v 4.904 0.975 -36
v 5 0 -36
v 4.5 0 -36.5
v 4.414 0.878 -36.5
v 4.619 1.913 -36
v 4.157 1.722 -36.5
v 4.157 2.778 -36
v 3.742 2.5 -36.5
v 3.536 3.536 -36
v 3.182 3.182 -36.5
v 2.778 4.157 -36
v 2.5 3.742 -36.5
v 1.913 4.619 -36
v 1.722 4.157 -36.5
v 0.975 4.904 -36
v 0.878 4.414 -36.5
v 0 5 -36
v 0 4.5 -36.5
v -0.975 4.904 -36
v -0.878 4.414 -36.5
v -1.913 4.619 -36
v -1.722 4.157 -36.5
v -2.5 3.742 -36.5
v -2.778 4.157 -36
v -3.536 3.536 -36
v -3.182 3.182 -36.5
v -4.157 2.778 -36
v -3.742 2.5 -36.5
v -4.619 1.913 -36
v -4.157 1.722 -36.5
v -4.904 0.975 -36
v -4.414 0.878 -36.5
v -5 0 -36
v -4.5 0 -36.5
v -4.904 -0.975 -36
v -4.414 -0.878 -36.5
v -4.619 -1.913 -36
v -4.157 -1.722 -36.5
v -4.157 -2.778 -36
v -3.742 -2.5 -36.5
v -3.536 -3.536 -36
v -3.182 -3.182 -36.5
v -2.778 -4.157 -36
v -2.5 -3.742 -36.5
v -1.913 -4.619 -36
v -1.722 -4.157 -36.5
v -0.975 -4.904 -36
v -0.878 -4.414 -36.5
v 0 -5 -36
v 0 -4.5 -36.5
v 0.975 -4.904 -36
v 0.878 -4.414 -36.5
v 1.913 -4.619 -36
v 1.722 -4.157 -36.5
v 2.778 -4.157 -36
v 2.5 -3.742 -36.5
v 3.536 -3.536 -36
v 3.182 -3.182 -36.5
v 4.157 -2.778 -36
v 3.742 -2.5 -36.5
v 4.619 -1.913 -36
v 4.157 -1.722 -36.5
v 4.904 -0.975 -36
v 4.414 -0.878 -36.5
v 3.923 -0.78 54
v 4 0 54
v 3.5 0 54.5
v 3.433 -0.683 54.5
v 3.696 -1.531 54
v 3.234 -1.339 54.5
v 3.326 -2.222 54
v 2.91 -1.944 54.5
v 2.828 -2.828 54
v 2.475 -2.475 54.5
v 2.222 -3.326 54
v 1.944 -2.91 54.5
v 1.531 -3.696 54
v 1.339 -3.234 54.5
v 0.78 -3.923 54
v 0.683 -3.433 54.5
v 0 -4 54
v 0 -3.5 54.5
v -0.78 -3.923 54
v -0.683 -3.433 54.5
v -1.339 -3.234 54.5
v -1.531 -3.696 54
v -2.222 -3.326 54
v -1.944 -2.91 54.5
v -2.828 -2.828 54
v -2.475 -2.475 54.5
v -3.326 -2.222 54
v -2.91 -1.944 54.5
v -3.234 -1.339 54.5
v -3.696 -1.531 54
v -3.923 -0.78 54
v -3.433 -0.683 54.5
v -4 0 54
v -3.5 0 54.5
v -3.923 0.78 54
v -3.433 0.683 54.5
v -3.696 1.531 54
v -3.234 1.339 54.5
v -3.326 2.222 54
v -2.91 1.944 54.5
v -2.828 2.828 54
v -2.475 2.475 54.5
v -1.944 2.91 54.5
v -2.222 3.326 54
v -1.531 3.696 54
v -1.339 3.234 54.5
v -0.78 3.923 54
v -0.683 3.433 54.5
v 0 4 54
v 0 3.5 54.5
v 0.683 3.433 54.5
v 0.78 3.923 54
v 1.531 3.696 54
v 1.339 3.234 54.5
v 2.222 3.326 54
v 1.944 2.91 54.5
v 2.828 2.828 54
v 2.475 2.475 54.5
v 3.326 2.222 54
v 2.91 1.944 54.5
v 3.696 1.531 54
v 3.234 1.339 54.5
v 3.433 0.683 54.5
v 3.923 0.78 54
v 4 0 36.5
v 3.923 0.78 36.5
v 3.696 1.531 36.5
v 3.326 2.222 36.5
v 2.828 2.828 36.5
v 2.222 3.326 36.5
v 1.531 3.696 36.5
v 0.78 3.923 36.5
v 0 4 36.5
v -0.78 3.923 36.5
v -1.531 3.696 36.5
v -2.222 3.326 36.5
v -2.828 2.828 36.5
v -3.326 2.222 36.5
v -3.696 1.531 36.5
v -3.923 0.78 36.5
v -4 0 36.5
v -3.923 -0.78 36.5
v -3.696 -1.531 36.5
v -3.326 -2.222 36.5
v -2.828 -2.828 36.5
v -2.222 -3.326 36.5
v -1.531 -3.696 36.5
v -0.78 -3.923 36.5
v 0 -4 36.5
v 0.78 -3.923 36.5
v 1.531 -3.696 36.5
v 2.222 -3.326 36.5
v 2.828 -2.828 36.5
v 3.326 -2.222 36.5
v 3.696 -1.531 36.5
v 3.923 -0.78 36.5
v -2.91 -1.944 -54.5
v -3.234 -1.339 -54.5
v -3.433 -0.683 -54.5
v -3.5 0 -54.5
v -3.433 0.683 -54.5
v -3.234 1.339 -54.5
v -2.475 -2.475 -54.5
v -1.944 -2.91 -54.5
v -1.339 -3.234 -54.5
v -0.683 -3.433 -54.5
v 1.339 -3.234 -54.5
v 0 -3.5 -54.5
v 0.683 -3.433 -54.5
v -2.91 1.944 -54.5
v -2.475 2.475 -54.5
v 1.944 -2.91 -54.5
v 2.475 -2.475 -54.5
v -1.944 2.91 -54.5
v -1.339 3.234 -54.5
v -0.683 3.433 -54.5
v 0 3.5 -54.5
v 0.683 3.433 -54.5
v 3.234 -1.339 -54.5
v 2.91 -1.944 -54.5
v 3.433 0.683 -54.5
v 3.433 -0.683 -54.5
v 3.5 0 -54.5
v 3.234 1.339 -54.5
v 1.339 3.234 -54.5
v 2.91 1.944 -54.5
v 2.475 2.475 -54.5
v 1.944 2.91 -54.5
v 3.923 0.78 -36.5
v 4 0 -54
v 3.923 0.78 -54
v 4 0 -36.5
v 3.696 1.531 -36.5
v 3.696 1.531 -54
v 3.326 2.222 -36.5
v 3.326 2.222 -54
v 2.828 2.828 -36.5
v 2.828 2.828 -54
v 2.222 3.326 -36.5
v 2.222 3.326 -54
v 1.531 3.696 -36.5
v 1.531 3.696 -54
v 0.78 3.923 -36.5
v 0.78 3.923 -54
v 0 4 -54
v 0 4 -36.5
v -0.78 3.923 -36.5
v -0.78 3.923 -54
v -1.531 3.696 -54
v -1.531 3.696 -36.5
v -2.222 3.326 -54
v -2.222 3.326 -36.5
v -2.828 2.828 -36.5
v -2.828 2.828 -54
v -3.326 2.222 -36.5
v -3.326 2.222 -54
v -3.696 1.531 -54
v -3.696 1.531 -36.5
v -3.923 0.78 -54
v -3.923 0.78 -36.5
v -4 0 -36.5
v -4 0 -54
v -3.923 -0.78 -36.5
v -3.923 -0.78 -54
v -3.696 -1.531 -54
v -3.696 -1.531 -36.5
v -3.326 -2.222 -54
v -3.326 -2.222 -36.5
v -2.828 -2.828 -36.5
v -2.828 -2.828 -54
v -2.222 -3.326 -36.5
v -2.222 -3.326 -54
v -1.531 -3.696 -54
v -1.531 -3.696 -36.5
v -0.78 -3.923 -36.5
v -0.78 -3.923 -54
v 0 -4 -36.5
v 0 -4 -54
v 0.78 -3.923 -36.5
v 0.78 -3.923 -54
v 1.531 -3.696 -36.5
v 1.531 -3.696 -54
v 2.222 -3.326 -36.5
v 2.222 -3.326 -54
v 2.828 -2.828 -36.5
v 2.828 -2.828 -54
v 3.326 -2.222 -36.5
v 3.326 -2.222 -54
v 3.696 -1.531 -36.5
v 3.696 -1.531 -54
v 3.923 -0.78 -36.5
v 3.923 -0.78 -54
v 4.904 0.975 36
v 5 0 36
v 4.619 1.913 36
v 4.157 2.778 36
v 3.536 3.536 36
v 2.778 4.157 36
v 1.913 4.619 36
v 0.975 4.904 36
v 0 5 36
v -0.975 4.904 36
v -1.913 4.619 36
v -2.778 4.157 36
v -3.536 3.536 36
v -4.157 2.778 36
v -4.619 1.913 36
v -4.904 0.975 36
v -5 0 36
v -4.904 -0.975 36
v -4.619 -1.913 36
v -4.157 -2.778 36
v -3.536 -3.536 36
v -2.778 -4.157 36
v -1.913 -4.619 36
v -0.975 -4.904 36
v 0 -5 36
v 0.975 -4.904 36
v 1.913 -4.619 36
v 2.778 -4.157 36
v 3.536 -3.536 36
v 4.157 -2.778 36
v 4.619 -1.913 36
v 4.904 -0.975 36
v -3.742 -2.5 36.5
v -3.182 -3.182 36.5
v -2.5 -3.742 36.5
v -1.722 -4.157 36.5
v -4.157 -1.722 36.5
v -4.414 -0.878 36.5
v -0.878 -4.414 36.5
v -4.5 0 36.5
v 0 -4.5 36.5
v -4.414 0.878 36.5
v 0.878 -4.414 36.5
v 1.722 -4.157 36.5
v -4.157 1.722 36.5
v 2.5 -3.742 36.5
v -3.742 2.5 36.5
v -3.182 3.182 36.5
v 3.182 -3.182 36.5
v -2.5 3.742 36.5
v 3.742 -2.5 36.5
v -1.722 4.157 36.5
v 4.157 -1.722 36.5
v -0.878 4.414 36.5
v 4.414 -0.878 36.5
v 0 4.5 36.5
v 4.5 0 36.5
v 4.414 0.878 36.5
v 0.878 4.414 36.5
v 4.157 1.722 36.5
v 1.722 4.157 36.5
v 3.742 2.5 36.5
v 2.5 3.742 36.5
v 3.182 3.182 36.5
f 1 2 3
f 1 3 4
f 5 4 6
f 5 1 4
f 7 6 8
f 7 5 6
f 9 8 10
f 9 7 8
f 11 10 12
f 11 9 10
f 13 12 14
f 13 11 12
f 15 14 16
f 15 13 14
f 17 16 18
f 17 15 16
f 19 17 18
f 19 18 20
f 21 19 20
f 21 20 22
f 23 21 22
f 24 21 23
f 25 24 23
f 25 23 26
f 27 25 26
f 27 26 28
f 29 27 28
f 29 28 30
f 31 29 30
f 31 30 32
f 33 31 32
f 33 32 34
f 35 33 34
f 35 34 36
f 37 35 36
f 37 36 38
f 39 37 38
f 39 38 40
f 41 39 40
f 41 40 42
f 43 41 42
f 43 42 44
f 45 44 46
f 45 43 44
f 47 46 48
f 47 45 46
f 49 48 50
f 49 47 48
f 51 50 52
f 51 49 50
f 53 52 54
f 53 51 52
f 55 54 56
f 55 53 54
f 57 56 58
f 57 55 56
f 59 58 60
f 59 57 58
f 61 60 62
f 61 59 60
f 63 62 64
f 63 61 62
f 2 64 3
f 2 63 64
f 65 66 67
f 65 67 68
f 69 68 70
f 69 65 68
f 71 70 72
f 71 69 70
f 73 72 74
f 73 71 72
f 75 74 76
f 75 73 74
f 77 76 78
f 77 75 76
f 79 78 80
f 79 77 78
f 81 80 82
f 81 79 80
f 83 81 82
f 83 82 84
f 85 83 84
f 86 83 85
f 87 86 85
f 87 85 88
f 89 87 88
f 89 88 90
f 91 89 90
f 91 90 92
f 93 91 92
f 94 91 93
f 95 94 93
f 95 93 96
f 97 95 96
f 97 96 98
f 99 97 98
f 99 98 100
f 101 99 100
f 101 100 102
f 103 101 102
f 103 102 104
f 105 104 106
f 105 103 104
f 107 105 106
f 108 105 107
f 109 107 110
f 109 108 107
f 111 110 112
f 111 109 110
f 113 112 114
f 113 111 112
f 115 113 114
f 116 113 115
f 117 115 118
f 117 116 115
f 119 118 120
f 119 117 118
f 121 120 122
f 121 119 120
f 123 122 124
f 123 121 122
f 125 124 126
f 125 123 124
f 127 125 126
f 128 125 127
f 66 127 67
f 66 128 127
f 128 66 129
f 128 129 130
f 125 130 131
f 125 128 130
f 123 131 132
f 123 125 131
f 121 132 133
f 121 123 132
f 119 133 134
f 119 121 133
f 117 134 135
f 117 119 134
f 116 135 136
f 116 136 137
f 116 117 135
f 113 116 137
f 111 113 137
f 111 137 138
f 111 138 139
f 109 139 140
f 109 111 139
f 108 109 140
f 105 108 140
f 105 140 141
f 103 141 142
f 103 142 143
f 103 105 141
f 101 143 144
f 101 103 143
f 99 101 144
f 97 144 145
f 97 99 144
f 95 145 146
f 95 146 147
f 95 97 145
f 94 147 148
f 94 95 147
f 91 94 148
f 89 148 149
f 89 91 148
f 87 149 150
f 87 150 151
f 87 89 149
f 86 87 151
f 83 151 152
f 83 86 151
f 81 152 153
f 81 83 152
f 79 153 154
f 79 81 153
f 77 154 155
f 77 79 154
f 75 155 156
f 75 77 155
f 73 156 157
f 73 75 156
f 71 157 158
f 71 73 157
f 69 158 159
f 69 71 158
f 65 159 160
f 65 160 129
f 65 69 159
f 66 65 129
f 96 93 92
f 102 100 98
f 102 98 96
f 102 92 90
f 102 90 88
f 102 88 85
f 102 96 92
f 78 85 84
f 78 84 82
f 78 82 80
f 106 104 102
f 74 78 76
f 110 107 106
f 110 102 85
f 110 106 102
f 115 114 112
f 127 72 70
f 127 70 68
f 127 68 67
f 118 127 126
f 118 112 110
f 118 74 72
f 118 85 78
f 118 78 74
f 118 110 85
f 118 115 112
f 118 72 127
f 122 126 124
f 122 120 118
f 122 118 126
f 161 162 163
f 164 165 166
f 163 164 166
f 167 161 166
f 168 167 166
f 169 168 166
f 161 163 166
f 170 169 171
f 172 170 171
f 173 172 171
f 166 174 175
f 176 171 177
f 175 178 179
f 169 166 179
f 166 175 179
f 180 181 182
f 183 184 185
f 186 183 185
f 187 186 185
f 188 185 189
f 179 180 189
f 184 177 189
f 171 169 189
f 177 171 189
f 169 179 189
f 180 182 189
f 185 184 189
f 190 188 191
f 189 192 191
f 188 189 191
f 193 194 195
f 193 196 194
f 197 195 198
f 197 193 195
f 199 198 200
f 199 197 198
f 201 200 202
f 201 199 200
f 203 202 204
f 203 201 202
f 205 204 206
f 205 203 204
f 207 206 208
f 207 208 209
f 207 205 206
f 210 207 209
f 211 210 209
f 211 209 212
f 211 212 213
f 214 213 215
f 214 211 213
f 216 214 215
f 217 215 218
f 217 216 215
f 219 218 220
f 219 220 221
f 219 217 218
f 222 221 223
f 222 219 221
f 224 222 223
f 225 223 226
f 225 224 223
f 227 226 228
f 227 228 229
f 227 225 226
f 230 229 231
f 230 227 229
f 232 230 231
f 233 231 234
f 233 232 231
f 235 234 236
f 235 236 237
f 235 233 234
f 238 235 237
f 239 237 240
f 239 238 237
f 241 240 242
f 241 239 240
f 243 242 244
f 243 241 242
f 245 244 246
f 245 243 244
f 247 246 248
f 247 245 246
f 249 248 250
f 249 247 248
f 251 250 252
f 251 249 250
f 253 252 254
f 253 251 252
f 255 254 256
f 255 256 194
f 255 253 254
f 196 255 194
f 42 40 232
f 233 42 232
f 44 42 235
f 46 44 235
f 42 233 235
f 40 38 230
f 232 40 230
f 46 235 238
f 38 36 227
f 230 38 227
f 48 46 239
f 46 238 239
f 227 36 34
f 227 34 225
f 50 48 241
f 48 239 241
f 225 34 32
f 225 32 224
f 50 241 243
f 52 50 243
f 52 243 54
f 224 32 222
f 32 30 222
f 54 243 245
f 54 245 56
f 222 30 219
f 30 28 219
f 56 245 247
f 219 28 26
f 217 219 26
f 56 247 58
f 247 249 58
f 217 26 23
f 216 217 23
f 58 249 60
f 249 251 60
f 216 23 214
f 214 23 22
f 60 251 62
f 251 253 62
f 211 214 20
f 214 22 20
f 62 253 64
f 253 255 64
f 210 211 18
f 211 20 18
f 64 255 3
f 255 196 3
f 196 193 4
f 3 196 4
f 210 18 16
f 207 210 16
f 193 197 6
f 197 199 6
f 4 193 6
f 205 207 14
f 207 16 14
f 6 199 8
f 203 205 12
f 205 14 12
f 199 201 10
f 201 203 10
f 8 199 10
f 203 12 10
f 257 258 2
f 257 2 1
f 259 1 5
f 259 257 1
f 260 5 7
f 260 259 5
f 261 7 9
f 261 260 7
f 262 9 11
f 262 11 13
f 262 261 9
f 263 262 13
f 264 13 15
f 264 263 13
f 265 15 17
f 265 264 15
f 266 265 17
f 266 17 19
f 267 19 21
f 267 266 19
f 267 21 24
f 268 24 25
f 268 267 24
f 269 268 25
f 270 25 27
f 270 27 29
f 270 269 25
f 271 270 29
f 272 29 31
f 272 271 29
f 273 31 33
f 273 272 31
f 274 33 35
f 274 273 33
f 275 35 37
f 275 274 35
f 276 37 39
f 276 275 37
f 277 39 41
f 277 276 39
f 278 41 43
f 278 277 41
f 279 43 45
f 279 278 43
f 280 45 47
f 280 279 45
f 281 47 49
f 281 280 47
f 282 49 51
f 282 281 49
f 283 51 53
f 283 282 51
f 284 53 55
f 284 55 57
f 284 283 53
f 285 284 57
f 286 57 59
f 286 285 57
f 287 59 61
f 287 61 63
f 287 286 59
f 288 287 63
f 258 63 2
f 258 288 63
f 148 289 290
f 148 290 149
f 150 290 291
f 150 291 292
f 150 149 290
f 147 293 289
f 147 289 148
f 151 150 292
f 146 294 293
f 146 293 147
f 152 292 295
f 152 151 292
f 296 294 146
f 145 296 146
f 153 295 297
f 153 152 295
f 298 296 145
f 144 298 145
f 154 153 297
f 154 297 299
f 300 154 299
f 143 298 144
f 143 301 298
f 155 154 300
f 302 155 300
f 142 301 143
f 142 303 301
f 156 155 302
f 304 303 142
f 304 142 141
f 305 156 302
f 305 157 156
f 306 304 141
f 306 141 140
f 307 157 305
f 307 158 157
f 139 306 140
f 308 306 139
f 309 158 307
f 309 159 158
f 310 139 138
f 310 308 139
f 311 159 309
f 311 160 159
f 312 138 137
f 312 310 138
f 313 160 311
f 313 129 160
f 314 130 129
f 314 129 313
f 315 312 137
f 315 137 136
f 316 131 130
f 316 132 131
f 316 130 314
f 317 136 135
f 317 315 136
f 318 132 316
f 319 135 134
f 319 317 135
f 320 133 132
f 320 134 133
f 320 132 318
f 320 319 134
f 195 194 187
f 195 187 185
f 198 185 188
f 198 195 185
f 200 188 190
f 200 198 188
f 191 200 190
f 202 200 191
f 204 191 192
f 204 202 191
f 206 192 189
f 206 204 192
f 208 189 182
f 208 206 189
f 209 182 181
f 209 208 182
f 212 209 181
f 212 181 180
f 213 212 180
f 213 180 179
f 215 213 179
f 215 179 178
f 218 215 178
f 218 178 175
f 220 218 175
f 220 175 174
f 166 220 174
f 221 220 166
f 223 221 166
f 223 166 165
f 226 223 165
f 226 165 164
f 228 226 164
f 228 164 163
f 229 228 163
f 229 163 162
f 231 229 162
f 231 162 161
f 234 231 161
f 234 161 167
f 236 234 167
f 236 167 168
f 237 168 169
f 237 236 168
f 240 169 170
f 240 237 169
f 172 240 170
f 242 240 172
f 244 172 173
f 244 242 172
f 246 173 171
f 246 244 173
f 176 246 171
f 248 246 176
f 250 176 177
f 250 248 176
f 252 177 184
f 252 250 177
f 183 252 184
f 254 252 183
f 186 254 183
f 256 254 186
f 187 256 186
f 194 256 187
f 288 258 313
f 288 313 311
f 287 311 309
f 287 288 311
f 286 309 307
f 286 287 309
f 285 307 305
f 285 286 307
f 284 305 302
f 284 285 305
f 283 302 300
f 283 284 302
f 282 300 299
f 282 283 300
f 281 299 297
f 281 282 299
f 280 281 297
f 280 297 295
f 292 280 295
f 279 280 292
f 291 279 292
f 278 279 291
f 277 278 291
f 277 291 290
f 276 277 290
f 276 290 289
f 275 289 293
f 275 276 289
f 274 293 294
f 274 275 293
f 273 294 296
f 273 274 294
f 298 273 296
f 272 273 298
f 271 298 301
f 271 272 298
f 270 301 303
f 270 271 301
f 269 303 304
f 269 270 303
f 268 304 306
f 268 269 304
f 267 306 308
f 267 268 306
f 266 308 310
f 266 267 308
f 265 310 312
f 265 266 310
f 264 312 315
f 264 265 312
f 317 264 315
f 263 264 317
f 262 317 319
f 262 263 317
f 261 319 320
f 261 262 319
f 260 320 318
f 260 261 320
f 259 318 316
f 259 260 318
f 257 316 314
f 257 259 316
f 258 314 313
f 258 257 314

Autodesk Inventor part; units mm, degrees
ref_plane "YZ Plane" through (0, 0, 0) normal (1, 0, 0) x (0, 1, 0)
ref_plane "XZ Plane" through (0, 0, 0) normal (0, 1, 0) x (-1, 0, 0)
ref_plane "XY Plane" through (0, 0, 0) normal (0, 0, 1) x (1, 0, 0)
sketch "Sketch1" plane through (0, 0, 0) normal (0, 1, 0) x (-1, 0, 0)
  line L0 (1, 0) -> (-6, 0) projected
  line L1 (0, -76.3) -> (0, 76.3) projected
  line L2 (0, -54.5) -> (-4, -54.5)
  line L3 (-4, -54.5) -> (-4, -36.5)
  line L4 (-4, -36.5) -> (-5, -36.5)
  line L5 (-5, -36.5) -> (-5, 36.5)
  line L6 (-5, 36.5) -> (-4, 36.5)
  line L7 (-4, 36.5) -> (-4, 54.5)
  line L8 (-4, 54.5) -> (0, 54.5)
  dimension "d1" = 18
  dimension "d2" = 8
  dimension "d3" = 10
  dimension "d5" = 8
  dimension "d8" = 18
  dimension "d9" = 73
revolve "Revolution1" add sketch "Sketch1" angle 360 about axis through (0, 0, -10) along (0, 0, 1)
chamfer "Chamfer1" distance 0.5 angle 45 4 edges at (-4, 0, -54.5) (-4, 0, 54.5) (-5, 0, 36.5) (-5, 0, -36.5)
thread "Thread1" size "M8x1.25" class "6g" standard "ANSI Metric M Profile" full length
thread "Thread2" size "M8x1.25" class "6g" standard "ANSI Metric M Profile" full length
equation "\"d5\" = d2"
equation "\"d8\" = d1"
properties part number "Rear Wheel Axle"
